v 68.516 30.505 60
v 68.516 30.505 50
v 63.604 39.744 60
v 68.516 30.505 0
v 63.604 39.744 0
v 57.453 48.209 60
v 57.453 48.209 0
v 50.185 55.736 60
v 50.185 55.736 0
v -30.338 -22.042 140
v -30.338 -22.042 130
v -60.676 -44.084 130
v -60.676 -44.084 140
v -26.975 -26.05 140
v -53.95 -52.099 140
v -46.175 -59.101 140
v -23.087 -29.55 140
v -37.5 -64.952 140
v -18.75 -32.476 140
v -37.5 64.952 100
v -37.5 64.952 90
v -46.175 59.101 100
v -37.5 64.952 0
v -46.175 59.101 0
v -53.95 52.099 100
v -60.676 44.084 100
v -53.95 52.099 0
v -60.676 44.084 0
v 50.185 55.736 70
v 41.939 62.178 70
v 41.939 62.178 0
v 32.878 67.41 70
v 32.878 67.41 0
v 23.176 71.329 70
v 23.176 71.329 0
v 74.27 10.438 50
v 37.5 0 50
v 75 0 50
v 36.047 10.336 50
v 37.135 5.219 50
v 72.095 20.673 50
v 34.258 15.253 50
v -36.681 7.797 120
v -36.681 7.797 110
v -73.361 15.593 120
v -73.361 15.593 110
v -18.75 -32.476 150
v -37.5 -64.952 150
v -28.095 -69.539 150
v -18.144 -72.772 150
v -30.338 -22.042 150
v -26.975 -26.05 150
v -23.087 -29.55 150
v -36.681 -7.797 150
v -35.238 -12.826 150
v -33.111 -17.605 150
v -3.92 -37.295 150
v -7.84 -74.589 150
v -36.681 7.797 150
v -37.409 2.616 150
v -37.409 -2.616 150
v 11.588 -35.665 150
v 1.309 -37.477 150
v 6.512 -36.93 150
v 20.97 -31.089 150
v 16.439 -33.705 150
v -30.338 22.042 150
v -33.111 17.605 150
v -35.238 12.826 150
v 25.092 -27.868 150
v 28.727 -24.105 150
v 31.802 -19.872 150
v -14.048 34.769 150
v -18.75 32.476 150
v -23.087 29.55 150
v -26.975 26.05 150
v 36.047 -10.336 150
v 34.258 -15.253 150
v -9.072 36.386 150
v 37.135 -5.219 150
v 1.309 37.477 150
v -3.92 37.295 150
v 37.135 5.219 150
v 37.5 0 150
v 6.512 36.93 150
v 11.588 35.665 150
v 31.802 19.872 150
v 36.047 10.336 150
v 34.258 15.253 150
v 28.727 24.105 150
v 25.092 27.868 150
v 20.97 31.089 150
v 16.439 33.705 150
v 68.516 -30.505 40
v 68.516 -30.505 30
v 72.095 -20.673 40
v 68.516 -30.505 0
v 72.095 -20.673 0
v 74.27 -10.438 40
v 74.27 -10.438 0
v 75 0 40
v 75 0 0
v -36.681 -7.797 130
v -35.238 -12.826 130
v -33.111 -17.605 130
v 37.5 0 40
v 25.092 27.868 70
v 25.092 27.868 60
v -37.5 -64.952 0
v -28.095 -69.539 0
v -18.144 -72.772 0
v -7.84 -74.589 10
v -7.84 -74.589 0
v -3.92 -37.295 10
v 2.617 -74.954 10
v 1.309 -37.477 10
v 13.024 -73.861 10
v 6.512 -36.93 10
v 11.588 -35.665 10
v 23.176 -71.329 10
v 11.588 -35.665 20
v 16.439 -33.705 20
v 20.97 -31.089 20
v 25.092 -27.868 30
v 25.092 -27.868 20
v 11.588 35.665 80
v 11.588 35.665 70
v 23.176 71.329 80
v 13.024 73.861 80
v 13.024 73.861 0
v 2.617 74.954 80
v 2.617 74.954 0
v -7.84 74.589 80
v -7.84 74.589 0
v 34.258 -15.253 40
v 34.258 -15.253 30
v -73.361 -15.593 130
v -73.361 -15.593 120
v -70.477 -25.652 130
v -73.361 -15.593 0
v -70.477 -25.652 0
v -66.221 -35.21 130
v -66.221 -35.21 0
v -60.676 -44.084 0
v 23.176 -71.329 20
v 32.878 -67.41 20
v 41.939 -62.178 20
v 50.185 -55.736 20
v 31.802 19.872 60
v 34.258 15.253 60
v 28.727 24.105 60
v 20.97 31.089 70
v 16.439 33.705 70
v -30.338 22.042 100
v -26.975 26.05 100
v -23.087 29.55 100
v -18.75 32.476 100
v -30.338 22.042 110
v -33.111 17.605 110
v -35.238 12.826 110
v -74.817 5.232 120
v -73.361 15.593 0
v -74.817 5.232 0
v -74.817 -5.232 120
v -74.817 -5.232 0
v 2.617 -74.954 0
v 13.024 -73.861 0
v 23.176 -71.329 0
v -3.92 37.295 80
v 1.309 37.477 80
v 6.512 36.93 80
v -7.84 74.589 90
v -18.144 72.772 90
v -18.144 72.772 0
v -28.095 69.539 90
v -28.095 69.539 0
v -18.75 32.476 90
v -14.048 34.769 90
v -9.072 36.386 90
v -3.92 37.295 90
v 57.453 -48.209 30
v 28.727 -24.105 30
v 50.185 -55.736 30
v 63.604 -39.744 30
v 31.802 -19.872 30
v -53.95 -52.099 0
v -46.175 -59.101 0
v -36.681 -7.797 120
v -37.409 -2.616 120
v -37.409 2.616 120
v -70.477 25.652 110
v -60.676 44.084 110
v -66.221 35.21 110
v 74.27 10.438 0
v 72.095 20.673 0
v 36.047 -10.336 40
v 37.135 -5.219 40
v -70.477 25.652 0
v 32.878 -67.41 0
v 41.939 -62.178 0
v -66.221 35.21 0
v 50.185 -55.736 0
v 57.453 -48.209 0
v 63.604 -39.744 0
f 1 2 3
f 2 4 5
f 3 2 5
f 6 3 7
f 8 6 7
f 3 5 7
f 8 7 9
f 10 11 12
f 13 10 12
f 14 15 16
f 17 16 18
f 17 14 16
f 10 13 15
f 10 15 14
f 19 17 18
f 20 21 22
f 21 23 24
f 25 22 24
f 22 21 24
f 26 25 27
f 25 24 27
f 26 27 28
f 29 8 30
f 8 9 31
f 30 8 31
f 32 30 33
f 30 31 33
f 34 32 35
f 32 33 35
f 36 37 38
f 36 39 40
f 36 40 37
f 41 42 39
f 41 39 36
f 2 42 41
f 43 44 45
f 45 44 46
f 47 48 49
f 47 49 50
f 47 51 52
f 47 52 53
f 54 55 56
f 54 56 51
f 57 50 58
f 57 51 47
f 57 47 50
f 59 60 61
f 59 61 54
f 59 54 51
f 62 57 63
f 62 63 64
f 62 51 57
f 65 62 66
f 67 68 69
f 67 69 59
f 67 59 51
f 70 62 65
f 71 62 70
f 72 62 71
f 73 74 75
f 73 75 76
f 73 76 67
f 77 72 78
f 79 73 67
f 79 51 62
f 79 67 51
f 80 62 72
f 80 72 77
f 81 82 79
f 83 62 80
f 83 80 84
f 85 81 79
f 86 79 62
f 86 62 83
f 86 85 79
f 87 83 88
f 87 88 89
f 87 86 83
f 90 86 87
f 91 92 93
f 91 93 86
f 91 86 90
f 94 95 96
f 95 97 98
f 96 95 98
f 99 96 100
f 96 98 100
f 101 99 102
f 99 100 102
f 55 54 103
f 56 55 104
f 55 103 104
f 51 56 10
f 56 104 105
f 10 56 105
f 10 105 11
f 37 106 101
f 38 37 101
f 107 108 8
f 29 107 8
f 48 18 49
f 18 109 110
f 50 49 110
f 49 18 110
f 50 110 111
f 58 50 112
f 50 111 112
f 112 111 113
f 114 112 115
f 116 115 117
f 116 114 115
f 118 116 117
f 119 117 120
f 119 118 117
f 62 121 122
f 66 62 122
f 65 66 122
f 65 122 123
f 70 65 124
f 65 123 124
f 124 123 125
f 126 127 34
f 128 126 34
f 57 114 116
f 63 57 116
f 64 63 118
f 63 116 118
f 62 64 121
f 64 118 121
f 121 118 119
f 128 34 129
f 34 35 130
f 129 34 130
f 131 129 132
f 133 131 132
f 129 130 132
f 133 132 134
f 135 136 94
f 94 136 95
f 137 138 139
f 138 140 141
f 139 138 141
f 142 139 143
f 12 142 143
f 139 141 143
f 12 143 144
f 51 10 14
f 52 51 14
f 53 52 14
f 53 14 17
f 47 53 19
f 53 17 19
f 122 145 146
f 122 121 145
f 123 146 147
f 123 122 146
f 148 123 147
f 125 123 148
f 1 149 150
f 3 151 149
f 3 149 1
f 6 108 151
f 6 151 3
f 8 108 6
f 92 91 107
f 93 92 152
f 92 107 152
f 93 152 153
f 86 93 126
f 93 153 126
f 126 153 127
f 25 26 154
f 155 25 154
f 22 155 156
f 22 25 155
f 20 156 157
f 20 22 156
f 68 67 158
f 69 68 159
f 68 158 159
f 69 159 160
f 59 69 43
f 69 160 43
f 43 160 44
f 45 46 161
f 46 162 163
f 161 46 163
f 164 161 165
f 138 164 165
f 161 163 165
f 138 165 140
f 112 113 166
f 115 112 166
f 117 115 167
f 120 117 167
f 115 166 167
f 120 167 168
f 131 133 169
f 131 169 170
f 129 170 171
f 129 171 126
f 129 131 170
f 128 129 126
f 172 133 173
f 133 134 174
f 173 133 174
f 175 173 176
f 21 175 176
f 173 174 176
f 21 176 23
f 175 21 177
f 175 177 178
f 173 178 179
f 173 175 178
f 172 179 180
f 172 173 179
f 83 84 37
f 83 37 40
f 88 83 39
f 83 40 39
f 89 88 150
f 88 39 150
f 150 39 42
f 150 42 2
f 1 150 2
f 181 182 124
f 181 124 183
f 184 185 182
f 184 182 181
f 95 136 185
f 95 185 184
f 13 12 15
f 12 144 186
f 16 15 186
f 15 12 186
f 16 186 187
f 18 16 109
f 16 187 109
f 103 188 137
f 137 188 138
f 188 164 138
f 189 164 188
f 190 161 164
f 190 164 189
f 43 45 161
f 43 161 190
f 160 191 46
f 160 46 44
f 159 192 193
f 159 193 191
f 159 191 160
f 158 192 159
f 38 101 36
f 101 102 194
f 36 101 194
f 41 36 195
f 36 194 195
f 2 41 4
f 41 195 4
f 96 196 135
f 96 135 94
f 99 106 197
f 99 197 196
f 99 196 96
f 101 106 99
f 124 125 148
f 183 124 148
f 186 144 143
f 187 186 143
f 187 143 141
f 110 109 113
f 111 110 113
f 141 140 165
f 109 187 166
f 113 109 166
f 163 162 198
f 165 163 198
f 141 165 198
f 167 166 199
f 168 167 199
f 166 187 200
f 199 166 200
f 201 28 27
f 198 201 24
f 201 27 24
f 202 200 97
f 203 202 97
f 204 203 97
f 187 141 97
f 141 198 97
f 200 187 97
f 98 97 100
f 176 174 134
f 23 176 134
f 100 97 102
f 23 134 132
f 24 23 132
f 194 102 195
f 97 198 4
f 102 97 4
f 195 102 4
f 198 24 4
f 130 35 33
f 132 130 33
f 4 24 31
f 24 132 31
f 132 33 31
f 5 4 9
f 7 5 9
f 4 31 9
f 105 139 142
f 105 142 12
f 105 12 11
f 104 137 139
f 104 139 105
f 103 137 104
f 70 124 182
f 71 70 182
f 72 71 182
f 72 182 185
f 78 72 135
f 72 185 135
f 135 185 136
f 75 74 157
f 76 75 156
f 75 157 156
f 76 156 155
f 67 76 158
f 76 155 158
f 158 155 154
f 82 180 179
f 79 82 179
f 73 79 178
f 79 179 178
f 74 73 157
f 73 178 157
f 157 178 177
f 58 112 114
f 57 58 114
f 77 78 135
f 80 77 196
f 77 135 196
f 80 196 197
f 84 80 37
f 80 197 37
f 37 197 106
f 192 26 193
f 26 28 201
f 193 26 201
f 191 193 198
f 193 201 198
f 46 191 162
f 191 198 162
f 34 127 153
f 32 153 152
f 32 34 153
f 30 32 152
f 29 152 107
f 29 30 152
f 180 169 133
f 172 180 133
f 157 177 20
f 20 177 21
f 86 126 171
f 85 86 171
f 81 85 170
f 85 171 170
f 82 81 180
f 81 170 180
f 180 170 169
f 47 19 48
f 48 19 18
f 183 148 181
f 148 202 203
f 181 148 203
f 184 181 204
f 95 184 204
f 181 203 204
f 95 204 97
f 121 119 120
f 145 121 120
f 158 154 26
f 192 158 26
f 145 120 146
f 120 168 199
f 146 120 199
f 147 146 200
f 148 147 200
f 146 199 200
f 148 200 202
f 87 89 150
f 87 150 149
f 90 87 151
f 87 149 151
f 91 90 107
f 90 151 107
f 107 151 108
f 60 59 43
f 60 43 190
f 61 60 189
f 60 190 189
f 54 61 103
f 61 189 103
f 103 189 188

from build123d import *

# Parameters (mm, degrees)
F1_DEPTH  = 150
F2_DEPTH  = 10
F3_DEPTH  = 20
F4_DEPTH  = 30
F5_DEPTH  = 40
F6_DEPTH  = 50
F7_DEPTH  = 60
F8_DEPTH  = 70
F9_DEPTH  = 80
F10_DEPTH = 90
F11_DEPTH = 100
F12_DEPTH = 110
F13_DEPTH = 120
F14_DEPTH = 130
F15_DEPTH = 140
F16_DEPTH = 150


with BuildPart() as f1:
    # F0 (on Top) → F1 (new body)
    with BuildSketch(Plane.XY):
        with BuildLine():
            ThreePointArc((34.257955, -15.252624), (36.680535, -7.796688), (37.5, 0))
            ThreePointArc((37.5, 0), (36.680535, 7.796688), (34.257955, 15.252624))
            ThreePointArc((34.257955, 15.252624), (30.338137, 22.041947), (25.092398, 27.867931))
            ThreePointArc((25.092398, 27.867931), (18.75, 32.475953), (11.588137, 35.664619))
            ThreePointArc((11.588137, 35.664619), (3.919817, 37.294571), (-3.919817, 37.294571))
            ThreePointArc((-3.919817, 37.294571), (-11.588137, 35.664619), (-18.75, 32.475953))
            ThreePointArc((-18.75, 32.475953), (-25.092398, 27.867931), (-30.338137, 22.041947))
            ThreePointArc((-30.338137, 22.041947), (-34.257955, 15.252624), (-36.680535, 7.796688))
            ThreePointArc((-36.680535, 7.796688), (-37.5, 0), (-36.680535, -7.796688))
            ThreePointArc((-36.680535, -7.796688), (-34.257955, -15.252624), (-30.338137, -22.041947))
            ThreePointArc((-30.338137, -22.041947), (-25.092398, -27.867931), (-18.75, -32.475953))
            ThreePointArc((-18.75, -32.475953), (-11.588137, -35.664619), (-3.919817, -37.294571))
            ThreePointArc((-3.919817, -37.294571), (3.919817, -37.294571), (11.588137, -35.664619))
            ThreePointArc((11.588137, -35.664619), (18.75, -32.475953), (25.092398, -27.867931))
            ThreePointArc((25.092398, -27.867931), (30.338137, -22.041947), (34.257955, -15.252624))
        make_face()
    extrude(amount=F1_DEPTH)

    # F0 (on Top) → F2 (join)
    with BuildSketch(Plane.XY):
        with BuildLine():
            ThreePointArc((-7.839635, -74.589142), (7.839635, -74.589142), (23.176275, -71.329239))
            Line((23.176275, -71.329239), (11.588137, -35.664619))
            ThreePointArc((11.588137, -35.664619), (3.919817, -37.294571), (-3.919817, -37.294571))
            Line((-3.919817, -37.294571), (-7.839635, -74.589142))
        make_face()
    extrude(amount=F2_DEPTH)

    # F0 (on Top) → F3 (join)
    with BuildSketch(Plane.XY):
        with BuildLine():
            ThreePointArc((23.176275, -71.329239), (37.5, -64.951905), (50.184795, -55.735862))
            Line((50.184795, -55.735862), (25.092398, -27.867931))
            ThreePointArc((25.092398, -27.867931), (18.75, -32.475953), (11.588137, -35.664619))
            Line((11.588137, -35.664619), (23.176275, -71.329239))
        make_face()
    extrude(amount=F3_DEPTH)

    # F0 (on Top) → F4 (join)
    with BuildSketch(Plane.XY):
        with BuildLine():
            ThreePointArc((50.184795, -55.735862), (60.676275, -44.083894), (68.515909, -30.505248))
            Line((68.515909, -30.505248), (34.257955, -15.252624))
            ThreePointArc((34.257955, -15.252624), (30.338137, -22.041947), (25.092398, -27.867931))
            Line((25.092398, -27.867931), (50.184795, -55.735862))
        make_face()
    extrude(amount=F4_DEPTH)

    # F0 (on Top) → F5 (join)
    with BuildSketch(Plane.XY):
        with BuildLine():
            ThreePointArc((68.515909, -30.505248), (73.36107, -15.593377), (75, 0))
            Line((75, 0), (37.5, 0))
            ThreePointArc((37.5, 0), (36.680535, -7.796688), (34.257955, -15.252624))
            Line((34.257955, -15.252624), (68.515909, -30.505248))
        make_face()
    extrude(amount=F5_DEPTH)

    # F0 (on Top) → F6 (join)
    with BuildSketch(Plane.XY):
        with BuildLine():
            Line((37.5, 0), (75, 0))
            ThreePointArc((75, 0), (73.36107, 15.593377), (68.515909, 30.505248))
            Line((68.515909, 30.505248), (34.257955, 15.252624))
            ThreePointArc((34.257955, 15.252624), (36.680535, 7.796688), (37.5, 0))
        make_face()
    extrude(amount=F6_DEPTH)

    # F0 (on Top) → F7 (join)
    with BuildSketch(Plane.XY):
        with BuildLine():
            Line((34.257955, 15.252624), (68.515909, 30.505248))
            ThreePointArc((68.515909, 30.505248), (60.676275, 44.083894), (50.184795, 55.735862))
            Line((50.184795, 55.735862), (25.092398, 27.867931))
            ThreePointArc((25.092398, 27.867931), (30.338137, 22.041947), (34.257955, 15.252624))
        make_face()
    extrude(amount=F7_DEPTH)

    # F0 (on Top) → F8 (join)
    with BuildSketch(Plane.XY):
        with BuildLine():
            Line((25.092398, 27.867931), (50.184795, 55.735862))
            ThreePointArc((50.184795, 55.735862), (37.5, 64.951905), (23.176275, 71.329239))
            Line((23.176275, 71.329239), (11.588137, 35.664619))
            ThreePointArc((11.588137, 35.664619), (18.75, 32.475953), (25.092398, 27.867931))
        make_face()
    extrude(amount=F8_DEPTH)

    # F0 (on Top) → F9 (join)
    with BuildSketch(Plane.XY):
        with BuildLine():
            Line((11.588137, 35.664619), (23.176275, 71.329239))
            ThreePointArc((23.176275, 71.329239), (7.839635, 74.589142), (-7.839635, 74.589142))
            Line((-7.839635, 74.589142), (-3.919817, 37.294571))
            ThreePointArc((-3.919817, 37.294571), (3.919817, 37.294571), (11.588137, 35.664619))
        make_face()
    extrude(amount=F9_DEPTH)

    # F0 (on Top) → F10 (join)
    with BuildSketch(Plane.XY):
        with BuildLine():
            Line((-3.919817, 37.294571), (-7.839635, 74.589142))
            ThreePointArc((-7.839635, 74.589142), (-23.176275, 71.329239), (-37.5, 64.951905))
            Line((-37.5, 64.951905), (-18.75, 32.475953))
            ThreePointArc((-18.75, 32.475953), (-11.588137, 35.664619), (-3.919817, 37.294571))
        make_face()
    extrude(amount=F10_DEPTH)

    # F0 (on Top) → F11 (join)
    with BuildSketch(Plane.XY):
        with BuildLine():
            Line((-18.75, 32.475953), (-37.5, 64.951905))
            ThreePointArc((-37.5, 64.951905), (-50.184795, 55.735862), (-60.676275, 44.083894))
            Line((-60.676275, 44.083894), (-30.338137, 22.041947))
            ThreePointArc((-30.338137, 22.041947), (-25.092398, 27.867931), (-18.75, 32.475953))
        make_face()
    extrude(amount=F11_DEPTH)

    # F0 (on Top) → F12 (join)
    with BuildSketch(Plane.XY):
        with BuildLine():
            Line((-30.338137, 22.041947), (-60.676275, 44.083894))
            ThreePointArc((-60.676275, 44.083894), (-68.515909, 30.505248), (-73.36107, 15.593377))
            Line((-73.36107, 15.593377), (-36.680535, 7.796688))
            ThreePointArc((-36.680535, 7.796688), (-34.257955, 15.252624), (-30.338137, 22.041947))
        make_face()
    extrude(amount=F12_DEPTH)

    # F0 (on Top) → F13 (join)
    with BuildSketch(Plane.XY):
        with BuildLine():
            Line((-36.680535, 7.796688), (-73.36107, 15.593377))
            ThreePointArc((-73.36107, 15.593377), (-75, 0), (-73.36107, -15.593377))
            Line((-73.36107, -15.593377), (-36.680535, -7.796688))
            ThreePointArc((-36.680535, -7.796688), (-37.5, 0), (-36.680535, 7.796688))
        make_face()
    extrude(amount=F13_DEPTH)

    # F0 (on Top) → F14 (join)
    with BuildSketch(Plane.XY):
        with BuildLine():
            ThreePointArc((-73.36107, -15.593377), (-68.515909, -30.505248), (-60.676275, -44.083894))
            Line((-60.676275, -44.083894), (-30.338137, -22.041947))
            ThreePointArc((-30.338137, -22.041947), (-34.257955, -15.252624), (-36.680535, -7.796688))
            Line((-36.680535, -7.796688), (-73.36107, -15.593377))
        make_face()
    extrude(amount=F14_DEPTH)

    # F0 (on Top) → F15 (join)
    with BuildSketch(Plane.XY):
        with BuildLine():
            ThreePointArc((-60.676275, -44.083894), (-50.184795, -55.735862), (-37.5, -64.951905))
            Line((-37.5, -64.951905), (-18.75, -32.475953))
            ThreePointArc((-18.75, -32.475953), (-25.092398, -27.867931), (-30.338137, -22.041947))
            Line((-30.338137, -22.041947), (-60.676275, -44.083894))
        make_face()
    extrude(amount=F15_DEPTH)

    # F0 (on Top) → F16 (join)
    with BuildSketch(Plane.XY):
        with BuildLine():
            ThreePointArc((-37.5, -64.951905), (-23.176275, -71.329239), (-7.839635, -74.589142))
            Line((-7.839635, -74.589142), (-3.919817, -37.294571))
            ThreePointArc((-3.919817, -37.294571), (-11.588137, -35.664619), (-18.75, -32.475953))
            Line((-18.75, -32.475953), (-37.5, -64.951905))
        make_face()
    extrude(amount=F16_DEPTH)


solid = f1.part
